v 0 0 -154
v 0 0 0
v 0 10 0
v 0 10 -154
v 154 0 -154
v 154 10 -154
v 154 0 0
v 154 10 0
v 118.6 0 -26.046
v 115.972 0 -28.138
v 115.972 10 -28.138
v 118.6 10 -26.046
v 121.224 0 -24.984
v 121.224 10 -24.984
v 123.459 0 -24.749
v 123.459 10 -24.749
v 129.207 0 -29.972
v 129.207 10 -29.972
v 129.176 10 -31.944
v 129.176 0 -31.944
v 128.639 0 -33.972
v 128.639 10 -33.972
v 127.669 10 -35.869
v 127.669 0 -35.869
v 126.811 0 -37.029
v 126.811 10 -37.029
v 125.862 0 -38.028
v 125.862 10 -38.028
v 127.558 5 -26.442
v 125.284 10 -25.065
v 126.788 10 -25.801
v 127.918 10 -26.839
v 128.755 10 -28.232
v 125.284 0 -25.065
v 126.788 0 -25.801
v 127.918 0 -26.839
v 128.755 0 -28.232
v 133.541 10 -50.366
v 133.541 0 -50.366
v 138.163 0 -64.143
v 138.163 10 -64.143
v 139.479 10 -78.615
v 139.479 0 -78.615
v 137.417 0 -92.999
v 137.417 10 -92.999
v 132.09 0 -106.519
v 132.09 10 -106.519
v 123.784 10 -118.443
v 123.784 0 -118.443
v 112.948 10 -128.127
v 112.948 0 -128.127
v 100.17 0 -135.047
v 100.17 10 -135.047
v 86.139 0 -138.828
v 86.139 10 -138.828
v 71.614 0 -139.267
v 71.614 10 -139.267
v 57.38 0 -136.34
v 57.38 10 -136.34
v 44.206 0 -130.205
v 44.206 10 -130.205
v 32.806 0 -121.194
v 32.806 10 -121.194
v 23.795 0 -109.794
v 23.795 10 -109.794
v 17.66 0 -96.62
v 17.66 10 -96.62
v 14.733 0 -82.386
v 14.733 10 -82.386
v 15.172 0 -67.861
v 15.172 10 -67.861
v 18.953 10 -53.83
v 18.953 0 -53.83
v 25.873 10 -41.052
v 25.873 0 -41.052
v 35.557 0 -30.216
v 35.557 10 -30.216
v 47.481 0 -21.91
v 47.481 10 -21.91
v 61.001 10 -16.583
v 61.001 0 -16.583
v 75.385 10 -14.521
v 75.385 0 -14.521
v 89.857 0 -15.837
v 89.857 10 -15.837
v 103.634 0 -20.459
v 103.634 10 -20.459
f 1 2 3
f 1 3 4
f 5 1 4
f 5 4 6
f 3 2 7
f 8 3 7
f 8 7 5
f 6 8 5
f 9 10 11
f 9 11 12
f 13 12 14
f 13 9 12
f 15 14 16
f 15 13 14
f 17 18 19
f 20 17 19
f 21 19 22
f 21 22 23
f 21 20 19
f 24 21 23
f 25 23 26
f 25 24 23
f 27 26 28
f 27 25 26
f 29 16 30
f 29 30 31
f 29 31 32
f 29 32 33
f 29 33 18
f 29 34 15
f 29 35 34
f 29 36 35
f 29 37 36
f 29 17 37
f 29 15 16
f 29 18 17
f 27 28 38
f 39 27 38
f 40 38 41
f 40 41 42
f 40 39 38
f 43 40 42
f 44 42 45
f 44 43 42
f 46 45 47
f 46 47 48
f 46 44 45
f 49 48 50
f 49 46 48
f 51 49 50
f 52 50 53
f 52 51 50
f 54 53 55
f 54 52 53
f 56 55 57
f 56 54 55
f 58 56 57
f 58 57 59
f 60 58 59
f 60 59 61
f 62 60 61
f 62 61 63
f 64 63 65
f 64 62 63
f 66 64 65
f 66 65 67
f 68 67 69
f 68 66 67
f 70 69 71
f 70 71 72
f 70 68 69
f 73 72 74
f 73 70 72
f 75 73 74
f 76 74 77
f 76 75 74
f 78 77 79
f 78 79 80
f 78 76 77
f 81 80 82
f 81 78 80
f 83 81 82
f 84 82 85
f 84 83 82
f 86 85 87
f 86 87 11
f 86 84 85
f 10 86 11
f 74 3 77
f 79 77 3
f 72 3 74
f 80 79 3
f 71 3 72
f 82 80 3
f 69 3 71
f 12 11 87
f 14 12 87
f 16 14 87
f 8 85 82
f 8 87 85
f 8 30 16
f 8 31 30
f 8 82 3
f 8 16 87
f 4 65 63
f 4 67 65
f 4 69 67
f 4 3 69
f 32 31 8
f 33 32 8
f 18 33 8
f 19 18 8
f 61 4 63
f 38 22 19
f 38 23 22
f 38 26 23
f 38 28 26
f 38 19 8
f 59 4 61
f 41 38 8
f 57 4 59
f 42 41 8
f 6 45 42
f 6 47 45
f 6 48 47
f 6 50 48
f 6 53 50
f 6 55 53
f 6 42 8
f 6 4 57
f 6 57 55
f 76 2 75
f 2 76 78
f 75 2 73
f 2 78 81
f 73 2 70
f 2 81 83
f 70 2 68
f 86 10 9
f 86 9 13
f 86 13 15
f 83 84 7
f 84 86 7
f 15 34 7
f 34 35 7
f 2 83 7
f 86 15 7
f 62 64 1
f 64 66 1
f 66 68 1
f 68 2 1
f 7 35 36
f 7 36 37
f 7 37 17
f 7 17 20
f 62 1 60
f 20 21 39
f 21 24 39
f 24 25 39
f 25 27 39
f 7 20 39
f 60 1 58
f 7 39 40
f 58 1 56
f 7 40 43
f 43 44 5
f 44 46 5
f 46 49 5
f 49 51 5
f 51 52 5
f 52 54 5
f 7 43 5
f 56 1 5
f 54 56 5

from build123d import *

# Parameters (mm, degrees)
SKETCH1_W           = 154
SKETCH1_H           = 154
BOSS_EXTRUDE1_DEPTH = 10


with BuildPart() as part:
    # Sketch1 → Boss-Extrude1 (new body)
    with BuildSketch(Plane(origin=(0, 0, 0), x_dir=(1, 0, 0), z_dir=(0, 1, 0))):
        with Locations((77, 77)):
            Rectangle(SKETCH1_W, SKETCH1_H)
        with BuildLine():
            ThreePointArc((125.861682212, 38.028394806), (32.805826176, 121.194173824), (115.971605194, 28.138317788))
            add(Edge.make_bspline(
                [(115.971605194, 28.138317788), (122.387611631, 21.271341921), (127.558134855, 26.441865145), (132.728658079, 31.612388369), (125.861682212, 38.028394806)],
                knots=[1.527172841, 1.527172841, 1.527172841, 3.141592654, 3.141592654, 4.756012466, 4.756012466, 4.756012466], degree=2, weights=[1, 0.691516576, 1, 0.691516576, 1]))
        make_face(mode=Mode.SUBTRACT)
    extrude(amount=BOSS_EXTRUDE1_DEPTH)


solid = part.part
